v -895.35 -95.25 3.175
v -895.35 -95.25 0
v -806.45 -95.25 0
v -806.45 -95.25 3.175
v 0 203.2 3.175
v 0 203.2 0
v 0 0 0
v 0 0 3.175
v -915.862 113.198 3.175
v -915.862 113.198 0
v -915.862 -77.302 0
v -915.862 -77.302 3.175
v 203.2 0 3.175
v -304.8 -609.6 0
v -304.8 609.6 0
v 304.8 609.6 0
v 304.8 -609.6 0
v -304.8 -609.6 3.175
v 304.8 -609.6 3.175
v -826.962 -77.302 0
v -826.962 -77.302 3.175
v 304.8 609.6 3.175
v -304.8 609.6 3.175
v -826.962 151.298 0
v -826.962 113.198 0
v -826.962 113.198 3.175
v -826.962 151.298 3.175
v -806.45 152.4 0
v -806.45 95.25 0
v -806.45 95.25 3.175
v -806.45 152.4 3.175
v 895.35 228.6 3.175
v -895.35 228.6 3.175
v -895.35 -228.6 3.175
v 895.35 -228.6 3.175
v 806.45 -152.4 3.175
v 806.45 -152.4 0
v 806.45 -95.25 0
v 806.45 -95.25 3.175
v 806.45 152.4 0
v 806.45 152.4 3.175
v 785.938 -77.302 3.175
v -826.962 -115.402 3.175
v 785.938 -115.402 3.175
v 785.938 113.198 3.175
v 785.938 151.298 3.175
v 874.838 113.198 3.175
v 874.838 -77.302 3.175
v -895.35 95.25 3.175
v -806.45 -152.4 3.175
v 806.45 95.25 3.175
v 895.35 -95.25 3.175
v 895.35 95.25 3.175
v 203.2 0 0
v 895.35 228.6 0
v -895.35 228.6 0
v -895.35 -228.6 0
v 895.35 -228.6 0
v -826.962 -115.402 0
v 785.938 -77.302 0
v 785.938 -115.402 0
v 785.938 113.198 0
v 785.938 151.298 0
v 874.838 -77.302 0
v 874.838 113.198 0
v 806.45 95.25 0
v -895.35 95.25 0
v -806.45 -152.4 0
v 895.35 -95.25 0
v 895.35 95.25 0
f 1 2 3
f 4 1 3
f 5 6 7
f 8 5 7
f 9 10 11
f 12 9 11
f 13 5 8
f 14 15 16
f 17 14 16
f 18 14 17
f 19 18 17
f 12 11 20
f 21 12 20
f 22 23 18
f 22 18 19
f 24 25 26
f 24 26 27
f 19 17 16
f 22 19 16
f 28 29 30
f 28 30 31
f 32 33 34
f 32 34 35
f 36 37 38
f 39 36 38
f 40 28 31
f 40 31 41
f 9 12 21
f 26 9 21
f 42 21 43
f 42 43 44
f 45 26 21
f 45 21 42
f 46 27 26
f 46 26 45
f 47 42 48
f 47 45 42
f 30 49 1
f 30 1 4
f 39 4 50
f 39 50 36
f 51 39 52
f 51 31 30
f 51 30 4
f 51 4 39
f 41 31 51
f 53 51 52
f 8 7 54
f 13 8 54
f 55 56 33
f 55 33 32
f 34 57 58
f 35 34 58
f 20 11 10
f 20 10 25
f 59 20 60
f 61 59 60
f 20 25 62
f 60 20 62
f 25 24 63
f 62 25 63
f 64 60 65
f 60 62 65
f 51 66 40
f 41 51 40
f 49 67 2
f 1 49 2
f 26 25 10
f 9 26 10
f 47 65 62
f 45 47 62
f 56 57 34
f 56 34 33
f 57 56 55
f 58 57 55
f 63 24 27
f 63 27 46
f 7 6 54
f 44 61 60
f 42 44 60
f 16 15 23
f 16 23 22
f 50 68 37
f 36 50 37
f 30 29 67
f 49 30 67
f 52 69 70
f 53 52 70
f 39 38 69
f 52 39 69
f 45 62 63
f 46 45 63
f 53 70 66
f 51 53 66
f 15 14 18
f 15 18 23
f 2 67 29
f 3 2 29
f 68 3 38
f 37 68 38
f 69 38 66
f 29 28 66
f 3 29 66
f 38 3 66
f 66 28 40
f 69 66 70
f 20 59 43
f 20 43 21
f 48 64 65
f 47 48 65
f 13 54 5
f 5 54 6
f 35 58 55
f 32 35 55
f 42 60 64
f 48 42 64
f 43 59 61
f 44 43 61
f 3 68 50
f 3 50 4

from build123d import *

# Parameters (mm, degrees)
F0_W     = 1612.9
F0_H     = 57.15
F1_DEPTH = 3.175
F2_W     = 1612.9
F2_H     = 38.1
F3_DEPTH = 3.175
F4_W     = 1790.7
F4_H     = 457.2
F5_DEPTH = 3.175
F7_DEPTH = 3.175
F8_W     = 609.6
F8_H     = 1219.2
F9_DEPTH = 3.175


with BuildPart() as f1:
    # F0 (on Top) → F1 (new body)
    with BuildSketch(Plane.XY):
        Polygon((-895.35, 95.25), (-895.35, -95.25), (-806.45, -95.25), (806.45, -95.25), (895.35, -95.25), (895.35, 95.25), (806.45, 95.25), (-806.45, 95.25), align=None)
        with Locations((0, 123.825)):
            Rectangle(F0_W, F0_H)
        with Locations((0, -123.825)):
            Rectangle(F0_W, F0_H)
    extrude(amount=F1_DEPTH)


with BuildPart() as f3:
    # F2 (on Top) → F3 (new body)
    with BuildSketch(Plane.XY):
        Polygon((-915.861635, 113.197696), (-915.861635, -77.302304), (-826.961635, -77.302304), (785.938365, -77.302304), (874.838365, -77.302304), (874.838365, 113.197696), (785.938365, 113.197696), (-826.961635, 113.197696), align=None)
        with Locations((-20.511635, 132.247696)):
            Rectangle(F2_W, F2_H)
        with Locations((-20.511635, -96.352304)):
            Rectangle(F2_W, F2_H)
    extrude(amount=F3_DEPTH)


with BuildPart() as f5:
    # F4 (on Top) → F5 (new body)
    with BuildSketch(Plane.XY):
        Rectangle(F4_W, F4_H)
    extrude(amount=F5_DEPTH)


with BuildPart() as f7:
    # F6 (on Top) → F7 (new body)
    with BuildSketch(Plane.XY):
        Polygon((0, 203.2), (0, 0), (203.2, 0), align=None)
    extrude(amount=F7_DEPTH)


with BuildPart() as f9:
    # F8 (on Top) → F9 (new body)
    with BuildSketch(Plane.XY):
        Rectangle(F8_W, F8_H)
    extrude(amount=F9_DEPTH)


solid = Compound([f1.part, f3.part, f5.part, f7.part, f9.part])
